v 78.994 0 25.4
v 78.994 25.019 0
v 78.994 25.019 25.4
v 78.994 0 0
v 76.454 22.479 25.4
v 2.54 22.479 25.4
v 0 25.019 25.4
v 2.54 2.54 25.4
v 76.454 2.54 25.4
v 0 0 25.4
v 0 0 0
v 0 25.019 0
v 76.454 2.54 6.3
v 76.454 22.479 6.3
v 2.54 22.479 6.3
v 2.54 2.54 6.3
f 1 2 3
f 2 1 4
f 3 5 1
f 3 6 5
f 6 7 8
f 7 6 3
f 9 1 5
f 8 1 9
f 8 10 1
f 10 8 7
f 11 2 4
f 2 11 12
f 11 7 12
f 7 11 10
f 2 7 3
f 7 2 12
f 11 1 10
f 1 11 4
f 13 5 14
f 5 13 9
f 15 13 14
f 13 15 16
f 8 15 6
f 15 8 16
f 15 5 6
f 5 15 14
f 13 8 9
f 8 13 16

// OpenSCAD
/* [Model Resolution (All dimensions are in Millimeters)] */
$fn = 256;

/* [Box Container Properties(Inside Diameter)] */

Length = 73.025;
Width = 19.05; 
Fit = .889;
Height = 25.4;
Wall_Thickness = 2.54;
Floor_Thickness = 6.3;

/* [Screw Hole Properties] */
Screw_Holes_On = false;
Screw_Hole_Diameter = 5.08;
Amount_Of_Screw_Holes = 2;
Chamfer_Adjust = 3.5;


difference()
{   
    // Outside Dimensions
    cube([ 
        Length+Fit+(Wall_Thickness * 2), 
        Width+Fit+(Wall_Thickness * 2), 
        Height ],
         center = false);
    // Inside Dimensions
    translate([ 
        Wall_Thickness, 
        Wall_Thickness, 
        Floor_Thickness])
        cube([ Length+Fit, Width+Fit, Height], center = false);
    if(Screw_Holes_On==true){
        // Screw Hole
        for (x = [1:Amount_Of_Screw_Holes])
            screwHoleBox(x,
                        Width+Fit,
                        Length+Fit,
                        Screw_Hole_Diameter,
                        Wall_Thickness,
                        Floor_Thickness,
                        Amount_Of_Screw_Holes);
        // Chamfer
        for(x=[1:Amount_Of_Screw_Holes])
        chamferHoleBox(
        x,
        Width+Fit,
        Length+Fit,
        Screw_Hole_Diameter,
        Wall_Thickness,
        Floor_Thickness,
        Amount_Of_Screw_Holes,
        Chamfer_Adjust);
    }
    
};

// Screw Hole
module
screwHoleBox(xPos,
             width,
             length,
             screwHoleDiameter,
             wallThickness,
             floorThickness,
             screwHoleAmount)
{
    translate([
        wallThickness +
           round(xPos*(length / (screwHoleAmount+1))),
        wallThickness + (width / 2),
        -floorThickness
    ]) cylinder(
        h = floorThickness+30, 
        d = screwHoleDiameter, 
        center = false);
}

module
chamferHoleBox(xPos,
               width,
               length,
               screwHoleDiameter,
               wallThickness,
               floorThickness,
               screwHoleAmount,
               chamferAdjust)
{
    translate([
        wallThickness + 
        round(xPos * (length / (screwHoleAmount+1))),
        wallThickness + (width / 2),
        floorThickness -
        chamferAdjust
    ]) cylinder(
        h = screwHoleDiameter, 
        d1 = screwHoleDiameter, 
        d2 = screwHoleDiameter*2, 
        center = false
        );
}
